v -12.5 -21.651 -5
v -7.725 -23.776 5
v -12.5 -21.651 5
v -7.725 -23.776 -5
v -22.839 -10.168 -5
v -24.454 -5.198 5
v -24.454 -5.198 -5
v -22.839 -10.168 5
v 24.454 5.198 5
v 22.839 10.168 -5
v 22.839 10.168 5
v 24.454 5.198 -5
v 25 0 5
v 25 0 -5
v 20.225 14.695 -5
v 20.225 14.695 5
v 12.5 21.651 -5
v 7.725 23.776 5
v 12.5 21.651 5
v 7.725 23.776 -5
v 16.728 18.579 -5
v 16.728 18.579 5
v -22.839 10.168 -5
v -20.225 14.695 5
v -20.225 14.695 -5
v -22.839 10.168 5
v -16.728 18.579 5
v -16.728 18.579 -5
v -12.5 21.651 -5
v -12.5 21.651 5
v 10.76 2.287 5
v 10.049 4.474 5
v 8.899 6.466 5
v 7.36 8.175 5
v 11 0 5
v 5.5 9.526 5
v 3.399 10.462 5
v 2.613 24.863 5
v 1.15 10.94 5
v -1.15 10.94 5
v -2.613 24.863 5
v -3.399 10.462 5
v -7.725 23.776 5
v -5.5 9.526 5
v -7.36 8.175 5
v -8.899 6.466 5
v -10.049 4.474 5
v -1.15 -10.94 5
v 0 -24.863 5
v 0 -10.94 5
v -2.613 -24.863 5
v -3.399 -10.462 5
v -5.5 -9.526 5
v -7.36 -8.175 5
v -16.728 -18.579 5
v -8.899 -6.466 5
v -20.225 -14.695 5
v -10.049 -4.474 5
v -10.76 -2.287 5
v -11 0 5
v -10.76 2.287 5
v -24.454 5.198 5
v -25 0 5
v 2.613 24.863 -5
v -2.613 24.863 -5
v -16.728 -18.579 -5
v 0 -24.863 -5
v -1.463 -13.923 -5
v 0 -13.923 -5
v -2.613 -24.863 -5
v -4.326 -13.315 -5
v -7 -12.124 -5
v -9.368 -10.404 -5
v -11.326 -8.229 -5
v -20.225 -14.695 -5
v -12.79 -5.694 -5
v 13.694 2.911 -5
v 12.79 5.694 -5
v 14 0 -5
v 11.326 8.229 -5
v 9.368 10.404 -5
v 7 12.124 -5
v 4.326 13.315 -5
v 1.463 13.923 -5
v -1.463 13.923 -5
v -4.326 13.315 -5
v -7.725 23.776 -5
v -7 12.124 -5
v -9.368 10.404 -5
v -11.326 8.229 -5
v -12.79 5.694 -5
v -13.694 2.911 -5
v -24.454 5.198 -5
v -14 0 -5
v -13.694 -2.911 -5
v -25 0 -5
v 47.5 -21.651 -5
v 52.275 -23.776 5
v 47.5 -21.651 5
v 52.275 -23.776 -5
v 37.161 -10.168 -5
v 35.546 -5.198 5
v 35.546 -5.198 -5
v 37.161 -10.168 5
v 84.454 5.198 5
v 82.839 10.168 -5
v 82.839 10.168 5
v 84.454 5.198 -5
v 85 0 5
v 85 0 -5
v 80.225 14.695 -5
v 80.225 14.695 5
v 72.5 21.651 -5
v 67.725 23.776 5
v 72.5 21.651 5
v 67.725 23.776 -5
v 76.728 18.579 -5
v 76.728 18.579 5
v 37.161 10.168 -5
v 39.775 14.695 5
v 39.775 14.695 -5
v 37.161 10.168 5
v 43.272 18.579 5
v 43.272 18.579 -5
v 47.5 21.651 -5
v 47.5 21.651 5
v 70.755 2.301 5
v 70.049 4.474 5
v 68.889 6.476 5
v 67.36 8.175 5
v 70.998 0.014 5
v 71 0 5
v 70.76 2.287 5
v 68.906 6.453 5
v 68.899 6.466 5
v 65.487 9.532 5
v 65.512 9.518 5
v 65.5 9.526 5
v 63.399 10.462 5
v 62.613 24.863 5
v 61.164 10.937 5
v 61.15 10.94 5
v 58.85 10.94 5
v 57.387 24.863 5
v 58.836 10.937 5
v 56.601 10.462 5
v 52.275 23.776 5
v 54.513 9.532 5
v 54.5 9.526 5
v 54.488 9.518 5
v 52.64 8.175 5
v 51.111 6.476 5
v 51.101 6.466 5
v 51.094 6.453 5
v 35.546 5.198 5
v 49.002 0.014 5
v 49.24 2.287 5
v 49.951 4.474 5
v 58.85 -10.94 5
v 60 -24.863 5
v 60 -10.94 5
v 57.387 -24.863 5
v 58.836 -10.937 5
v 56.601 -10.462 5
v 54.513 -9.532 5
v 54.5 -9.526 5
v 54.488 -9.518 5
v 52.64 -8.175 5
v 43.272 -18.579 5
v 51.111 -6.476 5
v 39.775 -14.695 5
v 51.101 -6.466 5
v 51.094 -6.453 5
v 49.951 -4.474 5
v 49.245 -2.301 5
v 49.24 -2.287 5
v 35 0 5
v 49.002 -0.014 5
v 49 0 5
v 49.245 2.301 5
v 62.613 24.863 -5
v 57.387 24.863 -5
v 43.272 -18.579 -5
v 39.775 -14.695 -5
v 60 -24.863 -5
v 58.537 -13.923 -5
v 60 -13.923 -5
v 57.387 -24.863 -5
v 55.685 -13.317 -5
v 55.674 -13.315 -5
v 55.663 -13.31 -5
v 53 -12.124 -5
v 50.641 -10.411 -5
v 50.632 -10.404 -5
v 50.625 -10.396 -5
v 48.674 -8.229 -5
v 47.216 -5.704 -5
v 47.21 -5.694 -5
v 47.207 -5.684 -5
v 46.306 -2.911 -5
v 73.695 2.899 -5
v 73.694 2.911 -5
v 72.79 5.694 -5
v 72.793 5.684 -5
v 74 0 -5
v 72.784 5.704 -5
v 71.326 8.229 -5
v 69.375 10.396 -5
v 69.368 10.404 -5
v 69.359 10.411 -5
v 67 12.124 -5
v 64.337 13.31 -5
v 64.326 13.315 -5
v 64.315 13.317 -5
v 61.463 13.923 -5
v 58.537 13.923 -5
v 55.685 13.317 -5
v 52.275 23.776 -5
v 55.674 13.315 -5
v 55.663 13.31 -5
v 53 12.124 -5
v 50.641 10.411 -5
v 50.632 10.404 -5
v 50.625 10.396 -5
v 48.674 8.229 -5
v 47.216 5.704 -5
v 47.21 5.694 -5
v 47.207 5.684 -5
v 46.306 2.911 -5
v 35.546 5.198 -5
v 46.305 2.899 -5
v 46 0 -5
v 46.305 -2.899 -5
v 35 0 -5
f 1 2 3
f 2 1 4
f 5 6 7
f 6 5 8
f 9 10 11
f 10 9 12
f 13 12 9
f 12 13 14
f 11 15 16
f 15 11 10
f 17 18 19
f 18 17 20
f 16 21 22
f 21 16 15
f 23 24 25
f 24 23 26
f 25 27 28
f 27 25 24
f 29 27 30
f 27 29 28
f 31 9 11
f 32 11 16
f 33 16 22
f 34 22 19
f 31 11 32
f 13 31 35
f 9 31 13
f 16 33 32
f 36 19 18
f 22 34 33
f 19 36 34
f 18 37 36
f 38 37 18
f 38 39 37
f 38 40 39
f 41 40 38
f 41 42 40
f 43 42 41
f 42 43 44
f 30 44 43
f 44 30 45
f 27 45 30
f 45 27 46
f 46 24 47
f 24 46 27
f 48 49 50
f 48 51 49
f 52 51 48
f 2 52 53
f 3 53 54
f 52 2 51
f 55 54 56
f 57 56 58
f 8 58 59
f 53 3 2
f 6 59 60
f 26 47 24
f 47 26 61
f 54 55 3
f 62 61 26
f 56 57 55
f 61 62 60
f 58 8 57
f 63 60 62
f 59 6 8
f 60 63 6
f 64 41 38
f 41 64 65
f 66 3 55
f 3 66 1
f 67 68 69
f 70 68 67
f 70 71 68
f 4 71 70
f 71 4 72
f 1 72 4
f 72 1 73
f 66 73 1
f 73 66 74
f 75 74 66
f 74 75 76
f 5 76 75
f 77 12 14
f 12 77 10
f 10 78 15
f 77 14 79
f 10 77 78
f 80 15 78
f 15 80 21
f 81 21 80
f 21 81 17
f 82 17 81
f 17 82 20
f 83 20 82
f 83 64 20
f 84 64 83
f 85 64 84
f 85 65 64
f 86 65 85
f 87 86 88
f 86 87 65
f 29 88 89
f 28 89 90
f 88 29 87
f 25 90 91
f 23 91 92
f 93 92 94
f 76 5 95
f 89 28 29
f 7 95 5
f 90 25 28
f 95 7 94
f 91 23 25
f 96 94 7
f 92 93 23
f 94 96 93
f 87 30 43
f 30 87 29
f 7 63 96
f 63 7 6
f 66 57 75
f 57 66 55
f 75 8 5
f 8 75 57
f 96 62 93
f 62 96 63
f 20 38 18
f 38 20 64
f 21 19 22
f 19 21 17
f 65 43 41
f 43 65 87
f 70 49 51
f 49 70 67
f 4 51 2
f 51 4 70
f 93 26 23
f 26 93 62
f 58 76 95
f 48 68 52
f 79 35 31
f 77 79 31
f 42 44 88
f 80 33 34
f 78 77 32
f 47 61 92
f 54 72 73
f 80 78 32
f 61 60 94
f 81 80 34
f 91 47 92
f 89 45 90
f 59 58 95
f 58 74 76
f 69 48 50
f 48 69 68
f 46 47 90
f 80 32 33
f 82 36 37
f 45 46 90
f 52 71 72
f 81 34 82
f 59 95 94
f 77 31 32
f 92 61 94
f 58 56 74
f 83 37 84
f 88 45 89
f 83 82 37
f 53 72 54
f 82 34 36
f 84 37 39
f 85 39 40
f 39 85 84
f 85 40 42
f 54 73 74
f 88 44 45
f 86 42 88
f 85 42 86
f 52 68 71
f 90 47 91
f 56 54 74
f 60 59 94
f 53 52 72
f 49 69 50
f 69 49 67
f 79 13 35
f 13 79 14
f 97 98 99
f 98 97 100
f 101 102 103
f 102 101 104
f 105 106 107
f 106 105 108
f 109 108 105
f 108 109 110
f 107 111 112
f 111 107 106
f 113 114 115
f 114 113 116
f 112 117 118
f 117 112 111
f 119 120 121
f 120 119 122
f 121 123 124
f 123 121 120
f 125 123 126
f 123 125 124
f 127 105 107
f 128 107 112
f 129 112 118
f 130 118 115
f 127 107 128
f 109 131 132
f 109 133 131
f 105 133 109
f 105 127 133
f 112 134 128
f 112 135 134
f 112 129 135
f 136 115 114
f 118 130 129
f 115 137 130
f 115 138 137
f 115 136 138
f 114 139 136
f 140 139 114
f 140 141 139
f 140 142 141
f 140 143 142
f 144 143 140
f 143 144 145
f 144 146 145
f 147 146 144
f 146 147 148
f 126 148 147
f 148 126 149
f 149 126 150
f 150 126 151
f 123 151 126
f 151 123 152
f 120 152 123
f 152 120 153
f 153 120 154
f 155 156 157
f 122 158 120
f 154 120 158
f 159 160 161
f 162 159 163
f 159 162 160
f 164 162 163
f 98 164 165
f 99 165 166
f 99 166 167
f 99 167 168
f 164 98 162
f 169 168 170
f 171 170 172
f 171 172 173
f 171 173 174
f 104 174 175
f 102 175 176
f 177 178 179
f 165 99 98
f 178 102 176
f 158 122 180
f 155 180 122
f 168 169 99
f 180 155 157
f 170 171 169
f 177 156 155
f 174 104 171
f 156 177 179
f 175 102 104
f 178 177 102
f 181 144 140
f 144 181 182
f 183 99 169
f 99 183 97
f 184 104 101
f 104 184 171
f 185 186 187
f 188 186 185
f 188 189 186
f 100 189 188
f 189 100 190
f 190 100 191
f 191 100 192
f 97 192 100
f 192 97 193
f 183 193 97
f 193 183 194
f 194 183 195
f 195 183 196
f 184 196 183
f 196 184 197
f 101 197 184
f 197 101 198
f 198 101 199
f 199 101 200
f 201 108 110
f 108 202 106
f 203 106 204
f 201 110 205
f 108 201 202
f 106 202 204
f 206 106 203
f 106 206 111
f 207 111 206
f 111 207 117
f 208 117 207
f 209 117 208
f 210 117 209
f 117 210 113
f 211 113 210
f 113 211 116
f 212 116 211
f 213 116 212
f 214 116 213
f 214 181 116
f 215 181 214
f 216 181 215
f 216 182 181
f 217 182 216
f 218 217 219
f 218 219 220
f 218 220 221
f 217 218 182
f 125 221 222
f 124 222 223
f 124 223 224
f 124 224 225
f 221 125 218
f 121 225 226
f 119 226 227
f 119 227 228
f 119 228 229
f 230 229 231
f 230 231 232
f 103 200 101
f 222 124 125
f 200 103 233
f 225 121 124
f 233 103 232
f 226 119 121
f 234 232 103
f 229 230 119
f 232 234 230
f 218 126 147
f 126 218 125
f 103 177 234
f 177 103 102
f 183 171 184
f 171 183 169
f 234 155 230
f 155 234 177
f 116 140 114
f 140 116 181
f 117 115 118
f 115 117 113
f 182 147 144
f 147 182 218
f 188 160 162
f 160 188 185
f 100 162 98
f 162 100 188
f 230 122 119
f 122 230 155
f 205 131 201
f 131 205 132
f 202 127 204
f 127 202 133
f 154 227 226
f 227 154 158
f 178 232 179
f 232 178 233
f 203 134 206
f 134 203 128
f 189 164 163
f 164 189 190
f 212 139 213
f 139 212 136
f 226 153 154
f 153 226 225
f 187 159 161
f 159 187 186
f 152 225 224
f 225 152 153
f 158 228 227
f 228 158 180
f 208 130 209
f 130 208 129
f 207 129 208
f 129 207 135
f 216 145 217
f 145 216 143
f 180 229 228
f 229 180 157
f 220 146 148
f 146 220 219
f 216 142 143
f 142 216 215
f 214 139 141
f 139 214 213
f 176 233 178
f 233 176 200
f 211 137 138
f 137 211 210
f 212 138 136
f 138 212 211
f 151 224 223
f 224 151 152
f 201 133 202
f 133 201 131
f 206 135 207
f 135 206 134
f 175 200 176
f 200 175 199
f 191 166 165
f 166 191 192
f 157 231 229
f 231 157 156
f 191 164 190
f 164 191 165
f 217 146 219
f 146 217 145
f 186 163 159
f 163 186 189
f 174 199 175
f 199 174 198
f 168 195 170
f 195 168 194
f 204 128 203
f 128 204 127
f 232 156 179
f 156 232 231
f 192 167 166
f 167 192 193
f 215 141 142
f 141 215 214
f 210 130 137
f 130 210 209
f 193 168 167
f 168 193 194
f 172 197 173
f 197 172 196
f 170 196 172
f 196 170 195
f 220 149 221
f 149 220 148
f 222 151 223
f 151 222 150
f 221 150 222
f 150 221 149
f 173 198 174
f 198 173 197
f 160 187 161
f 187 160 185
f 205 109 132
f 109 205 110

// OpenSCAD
b = 14; // bottom radius
t = 11; // top radius
h = 10; // height

// if no workey because a radius becomes negative, reduce the shift value
module extended_cylinder(h=0,r1=1,r2=1,shift=2,center=false) {
    slope = h / (r2-r1);
    // p for prime
    hp = (r1>0 && r2>0) ? h + shift : h + shift/2;
    bp = (r1>0)?r1-(1/slope)*(shift/2):0;
    tp = (r2>0)?r2+(1/slope)*(shift/2):0;
    translate([0,0,center?0:((r1>0)?-shift/2:0)])
    cylinder(hp,r1=bp,r2=tp,center=center);
}

difference(){
    cylinder(h,r=b+t,center=true);
    cylinder(h,r1=b,r2=t,center=true);
    translate([(b+t)/2,-(b+t)/2,0]) cube([b+t,b+t,h+1],center=true);
}

translate([2*(b+t)+10,0,0])
difference(){
    cylinder(h,r=b+t,center=true);
    extended_cylinder(h,b,t,0.1,true);
    translate([(b+t)/2,-(b+t)/2,0]) cube([b+t,b+t,h+1],center=true);
}
